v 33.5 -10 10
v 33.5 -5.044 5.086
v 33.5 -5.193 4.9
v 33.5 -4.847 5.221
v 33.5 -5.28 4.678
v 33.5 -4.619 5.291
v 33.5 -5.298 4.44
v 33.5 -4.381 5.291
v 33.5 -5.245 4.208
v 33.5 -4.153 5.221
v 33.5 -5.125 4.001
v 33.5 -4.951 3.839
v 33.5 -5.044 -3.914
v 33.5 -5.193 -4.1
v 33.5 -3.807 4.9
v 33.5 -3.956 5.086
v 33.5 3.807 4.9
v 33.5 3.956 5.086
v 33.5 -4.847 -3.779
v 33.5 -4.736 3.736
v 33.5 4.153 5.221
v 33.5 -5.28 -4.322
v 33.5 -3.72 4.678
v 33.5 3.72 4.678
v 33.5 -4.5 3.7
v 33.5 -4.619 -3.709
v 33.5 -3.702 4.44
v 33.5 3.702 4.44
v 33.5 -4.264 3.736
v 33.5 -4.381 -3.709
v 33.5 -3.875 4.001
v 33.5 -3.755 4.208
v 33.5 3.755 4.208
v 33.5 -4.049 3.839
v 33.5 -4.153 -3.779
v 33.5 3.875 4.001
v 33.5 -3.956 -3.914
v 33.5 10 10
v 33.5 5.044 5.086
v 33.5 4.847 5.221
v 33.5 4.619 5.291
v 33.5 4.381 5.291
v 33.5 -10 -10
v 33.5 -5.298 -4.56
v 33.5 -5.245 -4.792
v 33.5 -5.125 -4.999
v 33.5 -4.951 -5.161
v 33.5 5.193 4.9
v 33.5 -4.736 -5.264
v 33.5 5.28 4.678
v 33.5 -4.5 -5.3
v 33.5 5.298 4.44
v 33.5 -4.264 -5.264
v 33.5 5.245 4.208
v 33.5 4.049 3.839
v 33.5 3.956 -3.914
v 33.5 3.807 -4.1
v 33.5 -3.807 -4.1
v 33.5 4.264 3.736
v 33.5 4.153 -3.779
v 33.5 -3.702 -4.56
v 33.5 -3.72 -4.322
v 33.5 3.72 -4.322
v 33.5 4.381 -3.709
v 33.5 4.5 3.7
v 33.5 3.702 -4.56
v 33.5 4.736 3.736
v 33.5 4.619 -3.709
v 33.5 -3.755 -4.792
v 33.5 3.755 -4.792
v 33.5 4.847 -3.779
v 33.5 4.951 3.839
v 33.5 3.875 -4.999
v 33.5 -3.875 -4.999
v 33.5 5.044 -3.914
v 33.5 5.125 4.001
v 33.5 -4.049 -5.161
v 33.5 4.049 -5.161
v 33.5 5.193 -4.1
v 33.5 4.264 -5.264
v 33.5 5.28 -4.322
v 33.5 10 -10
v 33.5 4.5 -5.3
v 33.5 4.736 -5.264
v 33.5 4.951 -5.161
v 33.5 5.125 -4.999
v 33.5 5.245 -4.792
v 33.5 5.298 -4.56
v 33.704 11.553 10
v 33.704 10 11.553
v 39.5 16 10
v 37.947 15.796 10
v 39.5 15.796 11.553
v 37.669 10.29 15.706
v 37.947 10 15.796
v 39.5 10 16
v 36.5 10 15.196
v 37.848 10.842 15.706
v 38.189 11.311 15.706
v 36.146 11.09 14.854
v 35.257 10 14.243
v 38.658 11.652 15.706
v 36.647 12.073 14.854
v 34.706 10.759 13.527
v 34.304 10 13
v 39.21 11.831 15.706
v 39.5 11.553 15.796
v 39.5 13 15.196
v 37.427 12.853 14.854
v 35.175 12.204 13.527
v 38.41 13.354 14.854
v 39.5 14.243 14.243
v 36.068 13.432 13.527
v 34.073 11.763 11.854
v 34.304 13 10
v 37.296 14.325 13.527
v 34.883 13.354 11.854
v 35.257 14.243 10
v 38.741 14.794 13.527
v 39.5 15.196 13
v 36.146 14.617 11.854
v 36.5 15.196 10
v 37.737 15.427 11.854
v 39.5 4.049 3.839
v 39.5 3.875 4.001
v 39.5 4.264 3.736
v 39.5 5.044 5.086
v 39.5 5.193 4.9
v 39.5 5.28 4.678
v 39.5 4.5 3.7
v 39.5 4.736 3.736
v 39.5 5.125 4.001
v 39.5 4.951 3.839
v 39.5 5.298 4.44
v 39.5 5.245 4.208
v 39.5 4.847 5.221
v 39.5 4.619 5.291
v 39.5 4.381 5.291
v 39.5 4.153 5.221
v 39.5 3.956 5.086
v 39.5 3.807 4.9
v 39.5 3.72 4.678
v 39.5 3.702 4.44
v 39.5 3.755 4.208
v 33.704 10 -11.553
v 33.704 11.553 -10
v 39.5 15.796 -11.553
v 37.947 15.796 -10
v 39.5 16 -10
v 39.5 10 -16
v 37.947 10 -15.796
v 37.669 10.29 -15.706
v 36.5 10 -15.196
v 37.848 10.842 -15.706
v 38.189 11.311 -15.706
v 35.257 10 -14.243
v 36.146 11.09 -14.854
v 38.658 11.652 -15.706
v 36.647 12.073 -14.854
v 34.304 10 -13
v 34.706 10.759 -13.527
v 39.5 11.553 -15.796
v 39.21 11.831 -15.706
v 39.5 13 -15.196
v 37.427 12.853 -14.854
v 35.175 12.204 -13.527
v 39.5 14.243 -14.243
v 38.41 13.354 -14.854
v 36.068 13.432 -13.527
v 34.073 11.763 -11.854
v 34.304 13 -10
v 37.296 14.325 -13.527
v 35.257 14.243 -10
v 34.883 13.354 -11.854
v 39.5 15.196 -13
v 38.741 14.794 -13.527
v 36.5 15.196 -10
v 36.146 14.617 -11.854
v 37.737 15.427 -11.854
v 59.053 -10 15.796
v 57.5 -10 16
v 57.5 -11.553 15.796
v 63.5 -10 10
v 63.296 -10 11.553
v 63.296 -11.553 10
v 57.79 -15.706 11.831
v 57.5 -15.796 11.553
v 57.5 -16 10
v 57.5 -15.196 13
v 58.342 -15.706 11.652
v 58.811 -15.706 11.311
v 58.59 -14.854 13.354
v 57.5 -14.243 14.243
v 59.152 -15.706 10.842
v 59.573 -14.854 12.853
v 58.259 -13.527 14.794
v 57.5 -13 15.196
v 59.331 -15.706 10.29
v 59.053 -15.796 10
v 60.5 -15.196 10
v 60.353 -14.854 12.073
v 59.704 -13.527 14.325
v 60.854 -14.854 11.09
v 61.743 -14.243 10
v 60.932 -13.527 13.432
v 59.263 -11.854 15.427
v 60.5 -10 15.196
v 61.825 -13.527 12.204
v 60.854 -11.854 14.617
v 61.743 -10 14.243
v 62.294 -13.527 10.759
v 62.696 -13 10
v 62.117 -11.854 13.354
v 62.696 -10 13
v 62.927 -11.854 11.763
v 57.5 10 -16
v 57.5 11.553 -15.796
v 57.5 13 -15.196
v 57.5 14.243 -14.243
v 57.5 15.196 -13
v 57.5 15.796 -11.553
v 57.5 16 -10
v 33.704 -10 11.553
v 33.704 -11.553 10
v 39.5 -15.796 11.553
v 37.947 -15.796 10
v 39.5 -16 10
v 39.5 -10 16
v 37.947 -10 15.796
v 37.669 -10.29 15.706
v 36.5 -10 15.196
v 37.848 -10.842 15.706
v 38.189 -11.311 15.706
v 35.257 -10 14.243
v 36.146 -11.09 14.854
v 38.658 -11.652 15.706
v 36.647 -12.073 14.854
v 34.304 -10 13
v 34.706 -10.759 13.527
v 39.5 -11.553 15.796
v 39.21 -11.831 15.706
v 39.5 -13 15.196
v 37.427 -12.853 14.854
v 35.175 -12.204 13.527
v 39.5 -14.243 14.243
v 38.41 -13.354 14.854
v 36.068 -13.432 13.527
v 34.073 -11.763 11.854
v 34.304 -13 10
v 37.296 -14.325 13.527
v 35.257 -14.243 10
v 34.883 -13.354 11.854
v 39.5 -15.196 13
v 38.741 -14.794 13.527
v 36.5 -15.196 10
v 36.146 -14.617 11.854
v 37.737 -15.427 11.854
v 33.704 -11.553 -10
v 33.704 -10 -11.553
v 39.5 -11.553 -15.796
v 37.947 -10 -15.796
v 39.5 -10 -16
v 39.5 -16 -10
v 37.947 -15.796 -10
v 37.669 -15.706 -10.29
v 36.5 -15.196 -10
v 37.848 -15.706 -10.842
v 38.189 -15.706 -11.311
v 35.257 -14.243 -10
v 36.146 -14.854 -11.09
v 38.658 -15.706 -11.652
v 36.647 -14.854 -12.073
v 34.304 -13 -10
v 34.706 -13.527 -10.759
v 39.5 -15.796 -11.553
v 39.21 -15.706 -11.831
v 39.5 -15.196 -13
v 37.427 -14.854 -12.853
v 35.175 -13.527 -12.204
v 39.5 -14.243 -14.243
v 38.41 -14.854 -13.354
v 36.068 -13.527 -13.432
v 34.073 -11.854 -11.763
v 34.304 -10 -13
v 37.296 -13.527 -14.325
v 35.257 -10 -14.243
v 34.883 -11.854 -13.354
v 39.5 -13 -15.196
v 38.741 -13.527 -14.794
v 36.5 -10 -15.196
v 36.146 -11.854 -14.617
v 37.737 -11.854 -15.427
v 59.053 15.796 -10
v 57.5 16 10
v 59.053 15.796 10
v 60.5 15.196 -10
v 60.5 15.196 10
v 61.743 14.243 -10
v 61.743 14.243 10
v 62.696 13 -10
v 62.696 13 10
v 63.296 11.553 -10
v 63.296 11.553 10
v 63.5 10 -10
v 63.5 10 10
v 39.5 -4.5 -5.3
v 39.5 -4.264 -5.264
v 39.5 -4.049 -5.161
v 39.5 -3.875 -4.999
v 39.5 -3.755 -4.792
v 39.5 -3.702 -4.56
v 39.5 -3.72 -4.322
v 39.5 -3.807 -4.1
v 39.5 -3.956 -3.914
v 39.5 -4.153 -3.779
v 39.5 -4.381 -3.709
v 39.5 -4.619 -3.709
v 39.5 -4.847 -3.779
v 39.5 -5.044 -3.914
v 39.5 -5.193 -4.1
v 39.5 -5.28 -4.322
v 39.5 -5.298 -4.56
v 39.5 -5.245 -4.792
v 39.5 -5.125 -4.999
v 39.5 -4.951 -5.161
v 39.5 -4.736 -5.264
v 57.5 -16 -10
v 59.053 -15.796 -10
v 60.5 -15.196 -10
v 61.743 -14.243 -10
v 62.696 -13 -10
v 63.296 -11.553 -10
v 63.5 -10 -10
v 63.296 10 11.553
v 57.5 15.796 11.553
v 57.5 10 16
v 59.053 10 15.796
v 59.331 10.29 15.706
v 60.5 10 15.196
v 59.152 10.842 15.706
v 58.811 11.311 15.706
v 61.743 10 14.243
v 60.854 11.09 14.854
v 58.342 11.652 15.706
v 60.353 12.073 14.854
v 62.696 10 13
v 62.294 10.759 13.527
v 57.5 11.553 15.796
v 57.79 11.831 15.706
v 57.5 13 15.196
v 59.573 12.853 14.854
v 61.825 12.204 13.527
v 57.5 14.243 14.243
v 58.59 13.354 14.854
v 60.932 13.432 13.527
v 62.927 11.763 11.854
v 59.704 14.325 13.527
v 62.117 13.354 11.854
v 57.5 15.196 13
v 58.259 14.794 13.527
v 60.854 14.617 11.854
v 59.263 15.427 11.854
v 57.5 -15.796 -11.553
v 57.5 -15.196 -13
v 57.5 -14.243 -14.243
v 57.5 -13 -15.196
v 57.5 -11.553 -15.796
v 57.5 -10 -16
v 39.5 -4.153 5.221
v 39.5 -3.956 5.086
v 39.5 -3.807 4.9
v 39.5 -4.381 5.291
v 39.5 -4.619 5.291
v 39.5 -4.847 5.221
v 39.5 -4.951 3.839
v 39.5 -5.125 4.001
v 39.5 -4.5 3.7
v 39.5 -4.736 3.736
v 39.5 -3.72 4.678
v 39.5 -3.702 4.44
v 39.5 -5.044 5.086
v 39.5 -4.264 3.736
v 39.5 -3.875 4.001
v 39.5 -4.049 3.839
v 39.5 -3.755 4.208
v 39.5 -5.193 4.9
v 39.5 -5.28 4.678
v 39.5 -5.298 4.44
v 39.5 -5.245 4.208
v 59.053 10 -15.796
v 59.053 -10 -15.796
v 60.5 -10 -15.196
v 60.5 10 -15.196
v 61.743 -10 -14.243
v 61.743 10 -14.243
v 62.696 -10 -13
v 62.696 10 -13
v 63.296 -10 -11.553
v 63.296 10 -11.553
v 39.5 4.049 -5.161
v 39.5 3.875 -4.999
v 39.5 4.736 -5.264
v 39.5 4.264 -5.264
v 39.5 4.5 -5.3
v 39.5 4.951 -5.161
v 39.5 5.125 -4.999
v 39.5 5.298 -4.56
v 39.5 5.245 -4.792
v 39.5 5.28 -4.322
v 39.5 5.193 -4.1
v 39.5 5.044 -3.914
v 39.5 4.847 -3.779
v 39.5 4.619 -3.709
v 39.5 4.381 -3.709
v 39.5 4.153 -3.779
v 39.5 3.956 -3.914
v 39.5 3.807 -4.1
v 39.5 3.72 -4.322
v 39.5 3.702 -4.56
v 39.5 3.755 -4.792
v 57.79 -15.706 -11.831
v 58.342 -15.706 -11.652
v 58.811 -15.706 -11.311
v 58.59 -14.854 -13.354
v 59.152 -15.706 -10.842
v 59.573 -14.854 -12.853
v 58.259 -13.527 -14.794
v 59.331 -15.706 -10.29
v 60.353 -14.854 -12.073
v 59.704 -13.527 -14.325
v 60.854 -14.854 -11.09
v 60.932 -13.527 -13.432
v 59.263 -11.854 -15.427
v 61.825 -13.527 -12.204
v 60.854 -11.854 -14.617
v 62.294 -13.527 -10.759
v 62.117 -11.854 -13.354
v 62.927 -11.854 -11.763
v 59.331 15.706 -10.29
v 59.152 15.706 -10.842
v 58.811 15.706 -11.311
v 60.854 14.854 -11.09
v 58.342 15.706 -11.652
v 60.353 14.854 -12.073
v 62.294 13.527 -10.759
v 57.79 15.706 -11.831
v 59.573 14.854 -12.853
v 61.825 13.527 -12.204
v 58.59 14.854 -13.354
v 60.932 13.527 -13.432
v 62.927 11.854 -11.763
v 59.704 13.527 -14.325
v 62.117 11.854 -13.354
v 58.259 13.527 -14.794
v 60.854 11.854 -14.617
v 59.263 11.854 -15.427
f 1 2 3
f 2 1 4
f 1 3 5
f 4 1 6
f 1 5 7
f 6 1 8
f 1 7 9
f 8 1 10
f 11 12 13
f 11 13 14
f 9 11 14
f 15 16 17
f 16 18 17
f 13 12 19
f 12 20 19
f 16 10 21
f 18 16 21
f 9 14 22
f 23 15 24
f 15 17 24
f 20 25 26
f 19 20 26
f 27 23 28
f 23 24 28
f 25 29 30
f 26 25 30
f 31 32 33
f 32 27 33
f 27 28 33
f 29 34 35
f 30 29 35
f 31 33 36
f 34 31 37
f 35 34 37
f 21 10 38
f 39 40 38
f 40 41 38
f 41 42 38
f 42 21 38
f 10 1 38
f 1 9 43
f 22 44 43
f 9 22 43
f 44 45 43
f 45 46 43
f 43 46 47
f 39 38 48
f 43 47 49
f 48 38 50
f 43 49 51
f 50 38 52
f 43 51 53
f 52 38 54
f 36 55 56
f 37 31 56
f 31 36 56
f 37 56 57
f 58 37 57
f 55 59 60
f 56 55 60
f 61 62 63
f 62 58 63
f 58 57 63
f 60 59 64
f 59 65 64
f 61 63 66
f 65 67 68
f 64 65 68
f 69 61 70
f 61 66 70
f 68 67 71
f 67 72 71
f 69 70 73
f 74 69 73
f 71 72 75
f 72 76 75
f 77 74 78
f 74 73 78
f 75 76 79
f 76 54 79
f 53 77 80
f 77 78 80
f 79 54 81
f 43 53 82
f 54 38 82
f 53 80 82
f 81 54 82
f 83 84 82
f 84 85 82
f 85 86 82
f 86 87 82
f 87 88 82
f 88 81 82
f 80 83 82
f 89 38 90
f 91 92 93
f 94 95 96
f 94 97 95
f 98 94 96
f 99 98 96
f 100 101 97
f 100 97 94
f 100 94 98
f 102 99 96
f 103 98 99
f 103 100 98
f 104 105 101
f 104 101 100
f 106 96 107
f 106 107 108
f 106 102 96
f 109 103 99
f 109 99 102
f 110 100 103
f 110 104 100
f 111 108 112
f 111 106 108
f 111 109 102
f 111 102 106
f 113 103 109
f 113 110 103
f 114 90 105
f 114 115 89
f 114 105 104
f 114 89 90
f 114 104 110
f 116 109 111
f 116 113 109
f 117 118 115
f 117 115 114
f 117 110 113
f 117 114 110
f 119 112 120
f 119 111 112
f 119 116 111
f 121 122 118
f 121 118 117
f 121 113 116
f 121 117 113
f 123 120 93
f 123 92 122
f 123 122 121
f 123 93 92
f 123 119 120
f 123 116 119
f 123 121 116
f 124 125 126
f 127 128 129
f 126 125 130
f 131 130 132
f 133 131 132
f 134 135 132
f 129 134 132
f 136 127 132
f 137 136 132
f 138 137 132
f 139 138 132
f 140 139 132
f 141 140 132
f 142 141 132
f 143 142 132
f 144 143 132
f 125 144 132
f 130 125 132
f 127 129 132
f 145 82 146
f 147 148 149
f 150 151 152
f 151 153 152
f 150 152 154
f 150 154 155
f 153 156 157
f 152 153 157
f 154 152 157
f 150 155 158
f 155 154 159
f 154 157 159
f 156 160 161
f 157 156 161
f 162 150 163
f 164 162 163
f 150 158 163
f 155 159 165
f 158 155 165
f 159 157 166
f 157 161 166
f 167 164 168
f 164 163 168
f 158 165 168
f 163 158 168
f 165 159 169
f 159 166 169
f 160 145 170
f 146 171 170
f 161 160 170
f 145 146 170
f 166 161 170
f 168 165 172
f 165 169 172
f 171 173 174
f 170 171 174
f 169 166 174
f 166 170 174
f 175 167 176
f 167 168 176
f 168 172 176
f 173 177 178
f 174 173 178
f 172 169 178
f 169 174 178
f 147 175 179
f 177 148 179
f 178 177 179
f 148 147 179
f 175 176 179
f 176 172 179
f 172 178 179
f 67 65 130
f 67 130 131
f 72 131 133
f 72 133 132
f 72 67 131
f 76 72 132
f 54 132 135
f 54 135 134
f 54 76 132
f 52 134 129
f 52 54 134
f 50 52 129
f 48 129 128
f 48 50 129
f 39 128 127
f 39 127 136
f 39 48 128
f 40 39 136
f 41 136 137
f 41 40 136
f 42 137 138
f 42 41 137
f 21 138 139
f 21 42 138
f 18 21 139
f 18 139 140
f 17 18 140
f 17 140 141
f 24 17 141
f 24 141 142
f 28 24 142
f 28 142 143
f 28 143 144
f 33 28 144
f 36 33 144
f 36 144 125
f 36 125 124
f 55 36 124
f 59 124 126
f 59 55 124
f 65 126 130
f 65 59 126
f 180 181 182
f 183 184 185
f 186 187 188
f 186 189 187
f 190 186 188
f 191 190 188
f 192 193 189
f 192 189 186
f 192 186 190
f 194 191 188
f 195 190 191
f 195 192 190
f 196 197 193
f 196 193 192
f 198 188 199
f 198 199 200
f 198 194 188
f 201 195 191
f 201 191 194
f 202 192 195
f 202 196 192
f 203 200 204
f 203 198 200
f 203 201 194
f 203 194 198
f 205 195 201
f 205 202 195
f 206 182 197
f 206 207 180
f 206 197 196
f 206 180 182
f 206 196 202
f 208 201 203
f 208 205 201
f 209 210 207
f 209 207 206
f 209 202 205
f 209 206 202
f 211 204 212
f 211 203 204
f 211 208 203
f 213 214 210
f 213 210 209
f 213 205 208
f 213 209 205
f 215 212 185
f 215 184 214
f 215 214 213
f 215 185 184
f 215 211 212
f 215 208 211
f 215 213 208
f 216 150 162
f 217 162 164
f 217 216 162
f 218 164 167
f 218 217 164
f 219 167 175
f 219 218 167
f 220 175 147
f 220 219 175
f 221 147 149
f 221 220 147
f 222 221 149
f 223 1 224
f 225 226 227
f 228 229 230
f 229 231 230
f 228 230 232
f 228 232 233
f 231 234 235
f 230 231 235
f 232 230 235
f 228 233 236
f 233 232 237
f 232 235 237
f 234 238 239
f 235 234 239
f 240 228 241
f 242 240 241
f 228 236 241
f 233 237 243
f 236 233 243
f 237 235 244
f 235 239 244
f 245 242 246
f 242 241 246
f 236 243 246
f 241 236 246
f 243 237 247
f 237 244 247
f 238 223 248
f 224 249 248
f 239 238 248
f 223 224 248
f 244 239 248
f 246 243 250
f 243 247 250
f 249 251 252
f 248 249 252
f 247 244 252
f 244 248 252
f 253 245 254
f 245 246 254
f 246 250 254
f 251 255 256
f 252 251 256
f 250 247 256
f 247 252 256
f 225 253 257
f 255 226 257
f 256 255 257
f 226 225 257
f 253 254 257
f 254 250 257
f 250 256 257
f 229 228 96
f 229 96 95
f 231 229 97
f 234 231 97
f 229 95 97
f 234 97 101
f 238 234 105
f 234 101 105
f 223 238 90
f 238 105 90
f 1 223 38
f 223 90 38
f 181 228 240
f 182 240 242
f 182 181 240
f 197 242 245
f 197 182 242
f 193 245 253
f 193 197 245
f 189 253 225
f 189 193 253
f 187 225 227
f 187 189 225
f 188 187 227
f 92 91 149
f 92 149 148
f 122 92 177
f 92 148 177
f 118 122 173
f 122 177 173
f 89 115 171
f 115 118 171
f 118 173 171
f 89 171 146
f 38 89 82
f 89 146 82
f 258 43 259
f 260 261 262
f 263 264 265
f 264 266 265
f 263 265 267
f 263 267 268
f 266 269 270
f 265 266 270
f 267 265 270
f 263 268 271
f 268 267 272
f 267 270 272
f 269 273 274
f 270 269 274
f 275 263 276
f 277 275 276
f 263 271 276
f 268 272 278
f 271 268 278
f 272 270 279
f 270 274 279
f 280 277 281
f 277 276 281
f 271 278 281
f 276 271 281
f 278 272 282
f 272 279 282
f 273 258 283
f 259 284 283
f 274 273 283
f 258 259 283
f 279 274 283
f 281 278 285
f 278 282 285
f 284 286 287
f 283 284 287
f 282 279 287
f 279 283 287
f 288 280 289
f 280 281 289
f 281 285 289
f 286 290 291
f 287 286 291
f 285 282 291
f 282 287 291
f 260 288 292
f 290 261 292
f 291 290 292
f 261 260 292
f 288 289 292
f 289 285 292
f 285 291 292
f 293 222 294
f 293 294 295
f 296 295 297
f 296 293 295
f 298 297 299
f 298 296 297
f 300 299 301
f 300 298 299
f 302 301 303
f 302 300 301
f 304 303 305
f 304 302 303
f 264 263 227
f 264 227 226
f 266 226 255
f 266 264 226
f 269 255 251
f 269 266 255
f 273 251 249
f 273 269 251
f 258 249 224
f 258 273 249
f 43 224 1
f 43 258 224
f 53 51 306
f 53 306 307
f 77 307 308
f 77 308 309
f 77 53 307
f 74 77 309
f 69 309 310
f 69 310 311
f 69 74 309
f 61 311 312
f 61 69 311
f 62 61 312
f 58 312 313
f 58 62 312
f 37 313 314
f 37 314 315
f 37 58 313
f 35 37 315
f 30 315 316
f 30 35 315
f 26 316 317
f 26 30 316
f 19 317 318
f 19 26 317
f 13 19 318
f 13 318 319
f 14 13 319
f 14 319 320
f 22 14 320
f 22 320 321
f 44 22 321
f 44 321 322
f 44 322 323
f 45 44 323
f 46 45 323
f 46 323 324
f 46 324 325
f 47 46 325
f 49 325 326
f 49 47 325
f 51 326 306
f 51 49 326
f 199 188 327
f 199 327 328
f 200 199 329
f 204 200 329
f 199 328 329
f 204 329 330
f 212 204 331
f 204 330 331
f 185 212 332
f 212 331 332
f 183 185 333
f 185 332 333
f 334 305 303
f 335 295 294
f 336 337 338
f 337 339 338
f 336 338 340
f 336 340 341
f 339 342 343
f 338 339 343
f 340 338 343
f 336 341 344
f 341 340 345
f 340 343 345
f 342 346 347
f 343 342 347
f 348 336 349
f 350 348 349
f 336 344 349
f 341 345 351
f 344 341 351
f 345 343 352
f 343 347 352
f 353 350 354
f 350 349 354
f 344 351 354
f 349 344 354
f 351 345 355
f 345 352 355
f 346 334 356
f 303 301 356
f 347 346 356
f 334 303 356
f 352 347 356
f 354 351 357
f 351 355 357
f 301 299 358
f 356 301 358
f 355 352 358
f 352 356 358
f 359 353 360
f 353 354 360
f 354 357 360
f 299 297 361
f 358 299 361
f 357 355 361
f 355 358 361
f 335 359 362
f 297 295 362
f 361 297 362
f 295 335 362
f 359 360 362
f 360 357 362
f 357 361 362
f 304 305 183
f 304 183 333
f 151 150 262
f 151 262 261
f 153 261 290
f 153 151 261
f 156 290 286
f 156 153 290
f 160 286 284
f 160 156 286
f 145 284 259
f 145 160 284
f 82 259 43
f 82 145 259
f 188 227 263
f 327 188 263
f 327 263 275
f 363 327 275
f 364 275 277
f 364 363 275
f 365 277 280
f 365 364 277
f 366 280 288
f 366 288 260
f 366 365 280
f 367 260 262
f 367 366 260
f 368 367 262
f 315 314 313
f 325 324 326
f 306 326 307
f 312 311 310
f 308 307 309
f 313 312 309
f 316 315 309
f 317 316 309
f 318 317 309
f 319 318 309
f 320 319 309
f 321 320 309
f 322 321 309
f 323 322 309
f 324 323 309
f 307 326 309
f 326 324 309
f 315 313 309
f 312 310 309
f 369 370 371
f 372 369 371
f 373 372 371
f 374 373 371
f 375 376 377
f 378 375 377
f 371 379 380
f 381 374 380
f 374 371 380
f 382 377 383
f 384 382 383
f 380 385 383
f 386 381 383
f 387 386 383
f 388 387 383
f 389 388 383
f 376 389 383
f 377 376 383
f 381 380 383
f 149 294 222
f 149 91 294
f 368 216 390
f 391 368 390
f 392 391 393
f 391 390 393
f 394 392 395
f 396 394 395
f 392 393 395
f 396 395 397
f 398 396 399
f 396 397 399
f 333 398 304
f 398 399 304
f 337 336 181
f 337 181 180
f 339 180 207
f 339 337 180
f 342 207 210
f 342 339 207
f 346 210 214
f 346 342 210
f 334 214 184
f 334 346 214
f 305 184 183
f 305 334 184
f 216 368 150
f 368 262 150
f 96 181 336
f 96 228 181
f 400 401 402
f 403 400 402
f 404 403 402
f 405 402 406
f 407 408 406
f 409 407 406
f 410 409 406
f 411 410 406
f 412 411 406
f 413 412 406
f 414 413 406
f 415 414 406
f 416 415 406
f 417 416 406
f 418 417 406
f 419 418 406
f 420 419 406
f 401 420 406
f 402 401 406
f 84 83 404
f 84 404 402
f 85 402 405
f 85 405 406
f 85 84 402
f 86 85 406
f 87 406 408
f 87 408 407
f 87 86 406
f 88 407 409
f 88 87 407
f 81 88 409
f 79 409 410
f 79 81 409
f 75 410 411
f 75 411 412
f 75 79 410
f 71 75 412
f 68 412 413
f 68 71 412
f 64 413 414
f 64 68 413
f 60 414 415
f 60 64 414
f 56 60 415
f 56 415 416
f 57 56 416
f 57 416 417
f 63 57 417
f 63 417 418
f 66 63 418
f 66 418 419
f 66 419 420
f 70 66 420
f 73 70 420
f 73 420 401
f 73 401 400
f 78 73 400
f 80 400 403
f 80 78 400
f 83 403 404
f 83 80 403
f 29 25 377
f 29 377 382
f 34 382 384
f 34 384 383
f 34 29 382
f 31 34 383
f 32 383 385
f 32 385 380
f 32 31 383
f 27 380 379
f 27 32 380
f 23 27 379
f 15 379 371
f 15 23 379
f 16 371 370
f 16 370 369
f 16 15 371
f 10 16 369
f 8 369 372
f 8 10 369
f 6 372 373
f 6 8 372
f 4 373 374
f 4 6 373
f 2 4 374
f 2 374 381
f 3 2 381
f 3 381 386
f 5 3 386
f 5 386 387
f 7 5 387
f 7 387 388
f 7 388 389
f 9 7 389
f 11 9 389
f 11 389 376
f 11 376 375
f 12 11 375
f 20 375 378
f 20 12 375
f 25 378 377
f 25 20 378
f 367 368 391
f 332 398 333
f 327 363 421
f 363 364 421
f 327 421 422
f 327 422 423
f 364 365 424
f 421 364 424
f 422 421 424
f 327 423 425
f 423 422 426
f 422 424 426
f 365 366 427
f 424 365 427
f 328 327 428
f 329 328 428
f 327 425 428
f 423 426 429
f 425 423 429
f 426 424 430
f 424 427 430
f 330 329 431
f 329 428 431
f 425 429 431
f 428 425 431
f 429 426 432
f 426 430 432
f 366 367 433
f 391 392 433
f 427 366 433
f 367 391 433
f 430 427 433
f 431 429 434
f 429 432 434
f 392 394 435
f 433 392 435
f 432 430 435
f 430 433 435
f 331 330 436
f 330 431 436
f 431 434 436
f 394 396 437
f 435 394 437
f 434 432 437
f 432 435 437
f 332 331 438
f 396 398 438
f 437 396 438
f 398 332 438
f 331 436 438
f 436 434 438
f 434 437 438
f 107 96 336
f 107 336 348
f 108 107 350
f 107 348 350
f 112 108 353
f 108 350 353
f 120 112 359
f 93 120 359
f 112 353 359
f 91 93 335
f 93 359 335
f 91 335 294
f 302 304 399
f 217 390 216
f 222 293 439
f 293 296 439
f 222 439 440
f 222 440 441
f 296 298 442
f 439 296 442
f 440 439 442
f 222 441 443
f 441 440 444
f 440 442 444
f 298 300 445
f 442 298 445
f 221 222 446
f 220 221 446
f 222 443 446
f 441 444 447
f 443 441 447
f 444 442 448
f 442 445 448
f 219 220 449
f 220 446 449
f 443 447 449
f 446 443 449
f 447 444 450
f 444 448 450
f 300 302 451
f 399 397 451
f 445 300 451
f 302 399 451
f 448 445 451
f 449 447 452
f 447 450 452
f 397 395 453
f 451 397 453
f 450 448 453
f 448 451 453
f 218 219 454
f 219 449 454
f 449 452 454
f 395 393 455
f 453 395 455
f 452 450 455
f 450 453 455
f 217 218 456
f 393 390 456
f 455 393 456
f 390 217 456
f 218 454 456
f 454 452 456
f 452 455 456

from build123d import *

# Parameters (mm, degrees)
SKETCH1_W           = 32
SKETCH1_H           = 32
BOSS_EXTRUDE1_DEPTH = 30
FILLET1_R           = 6
SKETCH2_R           = 0.8
CUT_EXTRUDE2_DEPTH  = 6


with BuildPart() as part:
    # Sketch1 → Boss-Extrude1 (new body)
    with BuildSketch(Plane(origin=(33.5, 0, 0), x_dir=(0, 0, -1), z_dir=(1, 0, 0))):
        Rectangle(SKETCH1_W, SKETCH1_H)
    extrude(amount=BOSS_EXTRUDE1_DEPTH)

    # Fillet1
    fillet1_edges = [part.edges().sort_by_distance(p)[0] for p in [
        (63.5, 0, -16),
        (63.5, 16, 0),
        (63.5, 0, 16),
        (33.5, 16, 0),
        (33.5, 0, -16),
        (33.5, -16, 0),
        (33.5, 0, 16),
        (48.5, 16, 16),
        (48.5, 16, -16),
        (48.5, -16, -16),
        (48.5, -16, 16),
        (63.5, -16, 0),
    ]]
    fillet(fillet1_edges, radius=FILLET1_R)

    # Sketch2 → Cut-Extrude2 (cut)
    with BuildSketch(Plane(origin=(33.5, 0, 0), x_dir=(0, 0, -1), z_dir=(1, 0, 0))):
        with Locations((-4.5, -4.5)):
            Circle(SKETCH2_R)
        with Locations((4.5, -4.5)):
            Circle(SKETCH2_R)
        with Locations((-4.5, 4.5)):
            Circle(SKETCH2_R)
        with Locations((4.5, 4.5)):
            Circle(SKETCH2_R)
    extrude(amount=CUT_EXTRUDE2_DEPTH, mode=Mode.SUBTRACT)


solid = part.part
